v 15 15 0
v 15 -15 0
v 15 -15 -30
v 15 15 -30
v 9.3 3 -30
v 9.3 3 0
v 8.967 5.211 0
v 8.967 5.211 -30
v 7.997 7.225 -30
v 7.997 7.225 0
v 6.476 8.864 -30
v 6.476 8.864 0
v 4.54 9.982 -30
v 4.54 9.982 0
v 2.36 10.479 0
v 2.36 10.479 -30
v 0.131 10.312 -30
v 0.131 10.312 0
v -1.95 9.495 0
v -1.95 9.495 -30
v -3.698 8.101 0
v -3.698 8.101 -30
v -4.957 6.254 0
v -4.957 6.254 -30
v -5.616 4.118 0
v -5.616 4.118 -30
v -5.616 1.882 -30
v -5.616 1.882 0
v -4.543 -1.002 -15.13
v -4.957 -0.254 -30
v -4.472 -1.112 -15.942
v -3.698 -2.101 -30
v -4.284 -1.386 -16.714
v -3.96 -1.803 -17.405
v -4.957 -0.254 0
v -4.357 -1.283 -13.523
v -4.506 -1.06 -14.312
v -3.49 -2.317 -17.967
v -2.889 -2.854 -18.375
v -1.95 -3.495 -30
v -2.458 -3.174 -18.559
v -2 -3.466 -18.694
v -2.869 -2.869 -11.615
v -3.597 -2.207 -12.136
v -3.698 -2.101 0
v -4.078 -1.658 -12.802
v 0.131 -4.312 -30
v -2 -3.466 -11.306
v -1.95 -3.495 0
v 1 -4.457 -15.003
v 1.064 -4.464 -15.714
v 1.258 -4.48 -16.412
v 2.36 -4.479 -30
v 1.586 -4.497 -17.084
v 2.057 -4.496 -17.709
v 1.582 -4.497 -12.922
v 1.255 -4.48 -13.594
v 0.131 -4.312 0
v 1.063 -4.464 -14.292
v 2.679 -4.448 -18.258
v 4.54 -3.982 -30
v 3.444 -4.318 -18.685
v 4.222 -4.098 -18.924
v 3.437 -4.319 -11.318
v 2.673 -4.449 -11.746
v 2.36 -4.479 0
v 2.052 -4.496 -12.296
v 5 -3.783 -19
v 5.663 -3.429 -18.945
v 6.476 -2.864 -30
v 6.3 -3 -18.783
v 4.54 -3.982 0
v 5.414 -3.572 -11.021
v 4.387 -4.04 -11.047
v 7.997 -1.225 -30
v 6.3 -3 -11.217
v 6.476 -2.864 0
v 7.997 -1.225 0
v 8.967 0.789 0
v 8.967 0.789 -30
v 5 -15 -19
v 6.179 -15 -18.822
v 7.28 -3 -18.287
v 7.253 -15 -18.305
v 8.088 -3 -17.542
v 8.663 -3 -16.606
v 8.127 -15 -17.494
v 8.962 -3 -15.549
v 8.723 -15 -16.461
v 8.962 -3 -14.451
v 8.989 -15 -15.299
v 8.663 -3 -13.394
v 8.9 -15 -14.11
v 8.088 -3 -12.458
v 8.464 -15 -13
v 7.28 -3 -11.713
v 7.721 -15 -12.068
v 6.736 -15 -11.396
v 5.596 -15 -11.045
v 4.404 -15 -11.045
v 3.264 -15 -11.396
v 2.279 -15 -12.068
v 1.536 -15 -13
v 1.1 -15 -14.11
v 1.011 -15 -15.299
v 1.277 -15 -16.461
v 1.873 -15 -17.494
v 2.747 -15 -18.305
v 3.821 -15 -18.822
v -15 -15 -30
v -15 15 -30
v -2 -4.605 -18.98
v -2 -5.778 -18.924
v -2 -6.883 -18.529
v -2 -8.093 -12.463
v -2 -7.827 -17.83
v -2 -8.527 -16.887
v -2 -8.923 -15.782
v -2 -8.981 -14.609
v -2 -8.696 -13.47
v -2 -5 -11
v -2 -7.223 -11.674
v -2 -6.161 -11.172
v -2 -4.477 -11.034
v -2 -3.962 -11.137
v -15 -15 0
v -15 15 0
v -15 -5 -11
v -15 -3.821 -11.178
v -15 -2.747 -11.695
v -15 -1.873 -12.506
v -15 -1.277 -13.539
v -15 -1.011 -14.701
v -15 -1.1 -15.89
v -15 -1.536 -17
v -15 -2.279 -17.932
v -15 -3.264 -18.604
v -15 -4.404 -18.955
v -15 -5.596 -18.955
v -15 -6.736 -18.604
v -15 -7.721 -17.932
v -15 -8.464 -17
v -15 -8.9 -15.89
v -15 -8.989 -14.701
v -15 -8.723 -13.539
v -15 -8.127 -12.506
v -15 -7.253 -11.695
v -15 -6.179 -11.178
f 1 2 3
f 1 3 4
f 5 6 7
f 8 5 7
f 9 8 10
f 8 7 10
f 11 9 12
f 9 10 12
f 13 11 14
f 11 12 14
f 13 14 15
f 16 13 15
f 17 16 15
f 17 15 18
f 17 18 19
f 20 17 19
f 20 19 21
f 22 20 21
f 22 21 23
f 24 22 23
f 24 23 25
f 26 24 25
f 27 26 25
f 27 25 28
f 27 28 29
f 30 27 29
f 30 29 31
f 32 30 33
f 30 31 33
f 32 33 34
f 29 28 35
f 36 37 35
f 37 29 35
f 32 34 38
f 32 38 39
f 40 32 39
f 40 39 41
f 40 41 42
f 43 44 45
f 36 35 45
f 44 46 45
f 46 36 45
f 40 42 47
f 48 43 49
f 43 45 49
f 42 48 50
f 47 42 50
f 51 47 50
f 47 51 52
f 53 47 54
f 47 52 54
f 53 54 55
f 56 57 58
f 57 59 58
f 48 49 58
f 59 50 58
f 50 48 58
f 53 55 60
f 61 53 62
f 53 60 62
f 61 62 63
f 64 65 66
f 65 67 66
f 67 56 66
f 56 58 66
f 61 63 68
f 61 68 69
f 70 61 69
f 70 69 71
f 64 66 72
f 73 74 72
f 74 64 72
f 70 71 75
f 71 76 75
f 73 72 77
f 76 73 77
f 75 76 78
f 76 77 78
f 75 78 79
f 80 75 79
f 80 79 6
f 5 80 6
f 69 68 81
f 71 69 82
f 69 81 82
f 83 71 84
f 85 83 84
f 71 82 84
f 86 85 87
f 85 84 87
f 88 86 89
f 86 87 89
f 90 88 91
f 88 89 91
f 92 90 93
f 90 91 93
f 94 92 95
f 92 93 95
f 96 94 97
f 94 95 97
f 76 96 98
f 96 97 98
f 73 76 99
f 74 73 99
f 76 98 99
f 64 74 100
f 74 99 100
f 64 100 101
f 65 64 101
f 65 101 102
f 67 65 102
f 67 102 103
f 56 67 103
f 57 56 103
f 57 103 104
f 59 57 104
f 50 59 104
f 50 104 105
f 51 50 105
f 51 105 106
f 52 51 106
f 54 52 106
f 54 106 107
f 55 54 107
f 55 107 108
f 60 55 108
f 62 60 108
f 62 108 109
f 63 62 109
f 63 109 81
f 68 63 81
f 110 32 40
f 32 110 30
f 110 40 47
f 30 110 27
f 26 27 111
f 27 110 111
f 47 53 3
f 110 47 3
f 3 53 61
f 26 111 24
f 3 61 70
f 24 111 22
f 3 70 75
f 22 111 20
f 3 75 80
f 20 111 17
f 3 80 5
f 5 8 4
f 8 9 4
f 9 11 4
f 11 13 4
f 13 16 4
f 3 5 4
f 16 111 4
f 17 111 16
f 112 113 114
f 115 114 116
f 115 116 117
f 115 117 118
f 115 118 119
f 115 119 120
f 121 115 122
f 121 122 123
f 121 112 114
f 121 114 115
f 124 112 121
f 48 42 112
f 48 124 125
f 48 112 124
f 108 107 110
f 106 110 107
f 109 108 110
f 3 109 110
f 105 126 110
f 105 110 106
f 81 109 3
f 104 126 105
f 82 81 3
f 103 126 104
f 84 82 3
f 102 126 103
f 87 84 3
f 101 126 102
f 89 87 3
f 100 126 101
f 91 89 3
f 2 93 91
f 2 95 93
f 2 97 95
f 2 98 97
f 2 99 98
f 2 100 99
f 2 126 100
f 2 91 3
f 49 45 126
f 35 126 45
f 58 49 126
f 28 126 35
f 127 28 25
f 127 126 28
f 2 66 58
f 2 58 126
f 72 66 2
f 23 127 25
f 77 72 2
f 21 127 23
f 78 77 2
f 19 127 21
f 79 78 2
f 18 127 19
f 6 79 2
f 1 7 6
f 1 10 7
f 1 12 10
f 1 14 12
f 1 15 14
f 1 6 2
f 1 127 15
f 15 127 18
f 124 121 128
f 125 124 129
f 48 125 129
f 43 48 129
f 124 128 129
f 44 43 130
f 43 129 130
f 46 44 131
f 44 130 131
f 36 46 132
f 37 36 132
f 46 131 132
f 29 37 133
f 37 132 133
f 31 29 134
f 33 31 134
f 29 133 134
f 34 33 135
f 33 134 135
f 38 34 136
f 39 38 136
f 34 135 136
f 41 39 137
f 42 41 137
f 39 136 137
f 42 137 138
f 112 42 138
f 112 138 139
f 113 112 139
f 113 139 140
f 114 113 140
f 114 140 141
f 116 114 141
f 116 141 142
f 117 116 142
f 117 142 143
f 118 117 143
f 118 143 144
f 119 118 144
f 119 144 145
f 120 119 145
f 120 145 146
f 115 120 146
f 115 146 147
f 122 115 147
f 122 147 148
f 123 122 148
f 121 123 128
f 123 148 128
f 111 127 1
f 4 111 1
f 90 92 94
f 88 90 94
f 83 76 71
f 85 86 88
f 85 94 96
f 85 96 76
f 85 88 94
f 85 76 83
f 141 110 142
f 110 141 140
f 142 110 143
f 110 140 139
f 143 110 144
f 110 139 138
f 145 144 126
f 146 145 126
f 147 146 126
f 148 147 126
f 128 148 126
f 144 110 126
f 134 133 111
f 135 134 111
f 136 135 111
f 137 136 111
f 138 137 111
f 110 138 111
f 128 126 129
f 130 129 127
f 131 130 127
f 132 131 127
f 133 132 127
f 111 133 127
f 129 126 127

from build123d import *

# Parameters (mm, degrees)
SCHIZZO2_W                   = 30
SCHIZZO2_H                   = 30
SCHIZZO2_R                   = 7.5
ESTRUSIONE_ESTRUSIONE1_DEPTH = 30
SCHIZZO3_R                   = 4
TAGLIO_ESTRUSIONE1_DEPTH     = 13
SCHIZZO5_R                   = 4
TAGLIO_ESTRUSIONE2_DEPTH     = 12


with BuildPart() as part:
    # Schizzo2 → Estrusione-Estrusione1 (new body)
    with BuildSketch(Plane.XY):
        Rectangle(SCHIZZO2_W, SCHIZZO2_H)
        with Locations((1.8, 3)):
            Circle(SCHIZZO2_R, mode=Mode.SUBTRACT)
    extrude(amount=-ESTRUSIONE_ESTRUSIONE1_DEPTH)

    # Schizzo3 → Taglio-Estrusione1 (cut)
    with BuildSketch(Plane.ZY.offset(15)):
        with Locations((-15, -5)):
            Circle(SCHIZZO3_R)
    extrude(amount=-TAGLIO_ESTRUSIONE1_DEPTH, mode=Mode.SUBTRACT)

    # Schizzo5 → Taglio-Estrusione2 (cut)
    with BuildSketch(Plane.XZ.offset(15)):
        with Locations(Location((5, -15, 0), (0, 0, 270))):
            Circle(SCHIZZO5_R)
    extrude(amount=-TAGLIO_ESTRUSIONE2_DEPTH, mode=Mode.SUBTRACT)


solid = part.part
